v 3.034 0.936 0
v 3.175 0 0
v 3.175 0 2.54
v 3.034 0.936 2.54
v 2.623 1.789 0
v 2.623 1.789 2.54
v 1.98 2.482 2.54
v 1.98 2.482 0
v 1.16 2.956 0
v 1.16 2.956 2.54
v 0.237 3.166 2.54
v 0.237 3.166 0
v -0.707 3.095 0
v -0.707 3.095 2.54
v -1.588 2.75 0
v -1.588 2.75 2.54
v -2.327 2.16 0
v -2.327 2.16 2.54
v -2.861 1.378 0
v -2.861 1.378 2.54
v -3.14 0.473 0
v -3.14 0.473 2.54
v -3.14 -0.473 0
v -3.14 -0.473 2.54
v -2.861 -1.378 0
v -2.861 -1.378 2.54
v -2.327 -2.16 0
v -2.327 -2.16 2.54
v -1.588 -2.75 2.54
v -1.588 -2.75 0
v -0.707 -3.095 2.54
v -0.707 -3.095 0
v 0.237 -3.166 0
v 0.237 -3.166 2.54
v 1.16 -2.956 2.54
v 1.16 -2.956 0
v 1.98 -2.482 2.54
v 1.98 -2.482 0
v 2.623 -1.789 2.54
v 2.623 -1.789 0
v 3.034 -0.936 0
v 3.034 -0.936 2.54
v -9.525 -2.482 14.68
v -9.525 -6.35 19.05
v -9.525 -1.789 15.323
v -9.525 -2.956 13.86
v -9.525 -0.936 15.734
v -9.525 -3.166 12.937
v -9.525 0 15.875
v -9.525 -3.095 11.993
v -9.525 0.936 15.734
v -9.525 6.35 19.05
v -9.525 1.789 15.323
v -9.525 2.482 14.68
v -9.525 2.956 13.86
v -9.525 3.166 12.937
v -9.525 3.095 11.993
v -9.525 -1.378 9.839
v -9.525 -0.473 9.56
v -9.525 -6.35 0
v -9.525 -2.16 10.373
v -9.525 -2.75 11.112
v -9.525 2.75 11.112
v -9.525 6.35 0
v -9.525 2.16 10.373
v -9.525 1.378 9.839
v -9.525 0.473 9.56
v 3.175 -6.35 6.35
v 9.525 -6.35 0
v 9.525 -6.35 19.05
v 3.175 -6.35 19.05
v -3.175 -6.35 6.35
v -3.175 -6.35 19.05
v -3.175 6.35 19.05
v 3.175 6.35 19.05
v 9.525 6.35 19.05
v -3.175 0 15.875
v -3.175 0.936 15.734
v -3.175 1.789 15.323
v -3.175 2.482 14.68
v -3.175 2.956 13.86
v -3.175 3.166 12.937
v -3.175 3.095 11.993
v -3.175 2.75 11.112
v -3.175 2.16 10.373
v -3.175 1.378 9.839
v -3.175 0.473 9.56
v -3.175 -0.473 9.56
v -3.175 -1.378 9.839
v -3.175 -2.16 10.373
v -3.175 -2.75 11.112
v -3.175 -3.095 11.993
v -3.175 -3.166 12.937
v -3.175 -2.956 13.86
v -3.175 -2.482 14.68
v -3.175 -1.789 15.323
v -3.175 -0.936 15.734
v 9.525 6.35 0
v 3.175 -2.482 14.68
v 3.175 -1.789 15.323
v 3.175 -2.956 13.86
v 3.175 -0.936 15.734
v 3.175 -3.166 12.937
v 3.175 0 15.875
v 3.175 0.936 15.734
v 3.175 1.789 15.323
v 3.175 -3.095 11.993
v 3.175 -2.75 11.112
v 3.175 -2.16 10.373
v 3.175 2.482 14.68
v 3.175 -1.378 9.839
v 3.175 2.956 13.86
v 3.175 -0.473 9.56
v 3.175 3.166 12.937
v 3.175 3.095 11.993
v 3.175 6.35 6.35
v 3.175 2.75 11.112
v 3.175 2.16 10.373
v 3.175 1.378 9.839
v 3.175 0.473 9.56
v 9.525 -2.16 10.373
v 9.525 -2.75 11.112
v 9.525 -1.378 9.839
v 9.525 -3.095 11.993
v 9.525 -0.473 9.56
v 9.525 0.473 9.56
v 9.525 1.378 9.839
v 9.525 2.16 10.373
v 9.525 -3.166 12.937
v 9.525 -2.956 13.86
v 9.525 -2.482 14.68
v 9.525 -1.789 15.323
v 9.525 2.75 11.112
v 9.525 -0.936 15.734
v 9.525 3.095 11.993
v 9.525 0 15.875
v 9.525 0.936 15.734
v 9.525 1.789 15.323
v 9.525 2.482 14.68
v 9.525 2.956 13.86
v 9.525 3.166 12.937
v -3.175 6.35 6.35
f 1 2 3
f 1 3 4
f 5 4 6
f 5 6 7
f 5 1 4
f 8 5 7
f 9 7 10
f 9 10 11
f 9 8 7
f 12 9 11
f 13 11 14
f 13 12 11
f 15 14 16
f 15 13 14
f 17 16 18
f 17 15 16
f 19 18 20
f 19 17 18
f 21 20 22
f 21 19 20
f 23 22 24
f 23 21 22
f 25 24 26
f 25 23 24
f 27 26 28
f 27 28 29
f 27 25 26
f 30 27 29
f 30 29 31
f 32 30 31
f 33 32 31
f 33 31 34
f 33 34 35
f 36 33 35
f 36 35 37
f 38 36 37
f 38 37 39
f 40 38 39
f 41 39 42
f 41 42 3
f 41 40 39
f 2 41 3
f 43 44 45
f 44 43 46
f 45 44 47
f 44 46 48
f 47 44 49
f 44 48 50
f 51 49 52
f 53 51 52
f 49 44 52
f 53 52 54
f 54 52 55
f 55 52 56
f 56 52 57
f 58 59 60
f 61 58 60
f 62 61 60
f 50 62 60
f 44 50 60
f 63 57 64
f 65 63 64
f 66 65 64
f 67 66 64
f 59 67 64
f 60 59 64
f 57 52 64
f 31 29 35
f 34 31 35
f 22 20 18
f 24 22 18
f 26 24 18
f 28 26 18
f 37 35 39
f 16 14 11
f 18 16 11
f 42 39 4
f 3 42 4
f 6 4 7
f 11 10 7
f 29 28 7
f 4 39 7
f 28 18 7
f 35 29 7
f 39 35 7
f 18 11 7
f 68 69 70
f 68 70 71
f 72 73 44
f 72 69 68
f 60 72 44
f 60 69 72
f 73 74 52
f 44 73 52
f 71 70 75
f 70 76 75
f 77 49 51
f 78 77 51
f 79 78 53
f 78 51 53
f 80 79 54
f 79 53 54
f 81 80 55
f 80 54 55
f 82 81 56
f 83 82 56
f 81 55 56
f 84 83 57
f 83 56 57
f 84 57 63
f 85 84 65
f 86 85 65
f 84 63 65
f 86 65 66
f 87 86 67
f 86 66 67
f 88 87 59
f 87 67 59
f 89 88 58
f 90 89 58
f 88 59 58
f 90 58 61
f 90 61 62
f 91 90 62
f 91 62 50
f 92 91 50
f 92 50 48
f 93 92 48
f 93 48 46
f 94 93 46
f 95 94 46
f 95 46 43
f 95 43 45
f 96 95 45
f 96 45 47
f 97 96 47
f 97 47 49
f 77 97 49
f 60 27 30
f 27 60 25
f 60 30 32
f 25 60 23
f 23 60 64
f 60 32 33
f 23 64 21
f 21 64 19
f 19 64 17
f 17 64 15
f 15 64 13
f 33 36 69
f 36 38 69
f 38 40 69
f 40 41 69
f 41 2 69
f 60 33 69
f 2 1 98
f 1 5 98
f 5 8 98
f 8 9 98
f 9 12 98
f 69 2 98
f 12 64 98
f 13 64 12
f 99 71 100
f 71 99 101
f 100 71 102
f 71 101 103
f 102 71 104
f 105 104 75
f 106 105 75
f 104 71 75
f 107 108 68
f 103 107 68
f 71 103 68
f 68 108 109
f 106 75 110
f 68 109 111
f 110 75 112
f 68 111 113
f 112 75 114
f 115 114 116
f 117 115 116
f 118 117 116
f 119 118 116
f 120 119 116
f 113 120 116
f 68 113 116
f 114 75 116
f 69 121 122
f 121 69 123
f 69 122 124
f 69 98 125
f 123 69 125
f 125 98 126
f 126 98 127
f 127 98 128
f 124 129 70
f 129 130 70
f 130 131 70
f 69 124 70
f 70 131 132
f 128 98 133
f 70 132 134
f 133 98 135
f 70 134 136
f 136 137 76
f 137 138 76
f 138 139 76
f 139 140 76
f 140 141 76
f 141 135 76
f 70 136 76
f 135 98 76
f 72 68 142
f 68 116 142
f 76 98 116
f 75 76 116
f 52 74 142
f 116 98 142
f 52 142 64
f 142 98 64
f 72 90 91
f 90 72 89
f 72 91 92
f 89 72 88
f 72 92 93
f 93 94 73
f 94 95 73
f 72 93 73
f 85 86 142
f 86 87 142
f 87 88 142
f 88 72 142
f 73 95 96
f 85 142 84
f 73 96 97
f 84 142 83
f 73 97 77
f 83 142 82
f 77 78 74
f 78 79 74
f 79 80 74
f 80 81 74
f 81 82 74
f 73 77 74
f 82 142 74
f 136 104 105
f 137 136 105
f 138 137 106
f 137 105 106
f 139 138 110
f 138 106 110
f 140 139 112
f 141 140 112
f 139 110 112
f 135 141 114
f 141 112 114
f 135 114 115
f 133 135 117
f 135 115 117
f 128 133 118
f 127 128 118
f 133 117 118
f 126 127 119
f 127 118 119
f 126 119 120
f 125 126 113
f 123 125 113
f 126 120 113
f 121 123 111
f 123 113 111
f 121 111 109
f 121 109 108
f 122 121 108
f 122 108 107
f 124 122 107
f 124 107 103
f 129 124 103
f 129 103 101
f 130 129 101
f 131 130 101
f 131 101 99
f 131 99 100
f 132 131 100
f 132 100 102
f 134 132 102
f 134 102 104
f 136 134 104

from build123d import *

# Parameters (mm, degrees)
BOSS_EXTRUDE2_DEPTH = 6.35
SKETCH3_R           = 3.175
CUT_EXTRUDE1_DEPTH  = 28.679008291
SKETCH1_R           = 3.175
CUT_EXTRUDE2_DEPTH  = 2.54


with BuildPart() as part:
    # Sketch2 → Boss-Extrude2 (new, symmetric)
    with BuildSketch(Plane(origin=(0, 0, 0), x_dir=(1, 0, 0), z_dir=(0, 1, 0))):
        Polygon((-9.525, 0), (9.525, 0), (9.525, -19.05), (3.175, -19.05), (3.175, -6.35), (-3.175, -6.35), (-3.175, -19.05), (-9.525, -19.05), align=None)
    extrude(amount=BOSS_EXTRUDE2_DEPTH, both=True)

    # Sketch3 → Cut-Extrude1 (cut, through all)
    with BuildSketch(Plane.ZY.offset(9.525)):
        with Locations((12.7, 0)):
            Circle(SKETCH3_R)
    extrude(amount=-CUT_EXTRUDE1_DEPTH, mode=Mode.SUBTRACT)

    # Sketch1 → Cut-Extrude2 (cut)
    with BuildSketch(Plane.XY):
        Circle(SKETCH1_R)
    extrude(amount=CUT_EXTRUDE2_DEPTH, mode=Mode.SUBTRACT)


solid = part.part
